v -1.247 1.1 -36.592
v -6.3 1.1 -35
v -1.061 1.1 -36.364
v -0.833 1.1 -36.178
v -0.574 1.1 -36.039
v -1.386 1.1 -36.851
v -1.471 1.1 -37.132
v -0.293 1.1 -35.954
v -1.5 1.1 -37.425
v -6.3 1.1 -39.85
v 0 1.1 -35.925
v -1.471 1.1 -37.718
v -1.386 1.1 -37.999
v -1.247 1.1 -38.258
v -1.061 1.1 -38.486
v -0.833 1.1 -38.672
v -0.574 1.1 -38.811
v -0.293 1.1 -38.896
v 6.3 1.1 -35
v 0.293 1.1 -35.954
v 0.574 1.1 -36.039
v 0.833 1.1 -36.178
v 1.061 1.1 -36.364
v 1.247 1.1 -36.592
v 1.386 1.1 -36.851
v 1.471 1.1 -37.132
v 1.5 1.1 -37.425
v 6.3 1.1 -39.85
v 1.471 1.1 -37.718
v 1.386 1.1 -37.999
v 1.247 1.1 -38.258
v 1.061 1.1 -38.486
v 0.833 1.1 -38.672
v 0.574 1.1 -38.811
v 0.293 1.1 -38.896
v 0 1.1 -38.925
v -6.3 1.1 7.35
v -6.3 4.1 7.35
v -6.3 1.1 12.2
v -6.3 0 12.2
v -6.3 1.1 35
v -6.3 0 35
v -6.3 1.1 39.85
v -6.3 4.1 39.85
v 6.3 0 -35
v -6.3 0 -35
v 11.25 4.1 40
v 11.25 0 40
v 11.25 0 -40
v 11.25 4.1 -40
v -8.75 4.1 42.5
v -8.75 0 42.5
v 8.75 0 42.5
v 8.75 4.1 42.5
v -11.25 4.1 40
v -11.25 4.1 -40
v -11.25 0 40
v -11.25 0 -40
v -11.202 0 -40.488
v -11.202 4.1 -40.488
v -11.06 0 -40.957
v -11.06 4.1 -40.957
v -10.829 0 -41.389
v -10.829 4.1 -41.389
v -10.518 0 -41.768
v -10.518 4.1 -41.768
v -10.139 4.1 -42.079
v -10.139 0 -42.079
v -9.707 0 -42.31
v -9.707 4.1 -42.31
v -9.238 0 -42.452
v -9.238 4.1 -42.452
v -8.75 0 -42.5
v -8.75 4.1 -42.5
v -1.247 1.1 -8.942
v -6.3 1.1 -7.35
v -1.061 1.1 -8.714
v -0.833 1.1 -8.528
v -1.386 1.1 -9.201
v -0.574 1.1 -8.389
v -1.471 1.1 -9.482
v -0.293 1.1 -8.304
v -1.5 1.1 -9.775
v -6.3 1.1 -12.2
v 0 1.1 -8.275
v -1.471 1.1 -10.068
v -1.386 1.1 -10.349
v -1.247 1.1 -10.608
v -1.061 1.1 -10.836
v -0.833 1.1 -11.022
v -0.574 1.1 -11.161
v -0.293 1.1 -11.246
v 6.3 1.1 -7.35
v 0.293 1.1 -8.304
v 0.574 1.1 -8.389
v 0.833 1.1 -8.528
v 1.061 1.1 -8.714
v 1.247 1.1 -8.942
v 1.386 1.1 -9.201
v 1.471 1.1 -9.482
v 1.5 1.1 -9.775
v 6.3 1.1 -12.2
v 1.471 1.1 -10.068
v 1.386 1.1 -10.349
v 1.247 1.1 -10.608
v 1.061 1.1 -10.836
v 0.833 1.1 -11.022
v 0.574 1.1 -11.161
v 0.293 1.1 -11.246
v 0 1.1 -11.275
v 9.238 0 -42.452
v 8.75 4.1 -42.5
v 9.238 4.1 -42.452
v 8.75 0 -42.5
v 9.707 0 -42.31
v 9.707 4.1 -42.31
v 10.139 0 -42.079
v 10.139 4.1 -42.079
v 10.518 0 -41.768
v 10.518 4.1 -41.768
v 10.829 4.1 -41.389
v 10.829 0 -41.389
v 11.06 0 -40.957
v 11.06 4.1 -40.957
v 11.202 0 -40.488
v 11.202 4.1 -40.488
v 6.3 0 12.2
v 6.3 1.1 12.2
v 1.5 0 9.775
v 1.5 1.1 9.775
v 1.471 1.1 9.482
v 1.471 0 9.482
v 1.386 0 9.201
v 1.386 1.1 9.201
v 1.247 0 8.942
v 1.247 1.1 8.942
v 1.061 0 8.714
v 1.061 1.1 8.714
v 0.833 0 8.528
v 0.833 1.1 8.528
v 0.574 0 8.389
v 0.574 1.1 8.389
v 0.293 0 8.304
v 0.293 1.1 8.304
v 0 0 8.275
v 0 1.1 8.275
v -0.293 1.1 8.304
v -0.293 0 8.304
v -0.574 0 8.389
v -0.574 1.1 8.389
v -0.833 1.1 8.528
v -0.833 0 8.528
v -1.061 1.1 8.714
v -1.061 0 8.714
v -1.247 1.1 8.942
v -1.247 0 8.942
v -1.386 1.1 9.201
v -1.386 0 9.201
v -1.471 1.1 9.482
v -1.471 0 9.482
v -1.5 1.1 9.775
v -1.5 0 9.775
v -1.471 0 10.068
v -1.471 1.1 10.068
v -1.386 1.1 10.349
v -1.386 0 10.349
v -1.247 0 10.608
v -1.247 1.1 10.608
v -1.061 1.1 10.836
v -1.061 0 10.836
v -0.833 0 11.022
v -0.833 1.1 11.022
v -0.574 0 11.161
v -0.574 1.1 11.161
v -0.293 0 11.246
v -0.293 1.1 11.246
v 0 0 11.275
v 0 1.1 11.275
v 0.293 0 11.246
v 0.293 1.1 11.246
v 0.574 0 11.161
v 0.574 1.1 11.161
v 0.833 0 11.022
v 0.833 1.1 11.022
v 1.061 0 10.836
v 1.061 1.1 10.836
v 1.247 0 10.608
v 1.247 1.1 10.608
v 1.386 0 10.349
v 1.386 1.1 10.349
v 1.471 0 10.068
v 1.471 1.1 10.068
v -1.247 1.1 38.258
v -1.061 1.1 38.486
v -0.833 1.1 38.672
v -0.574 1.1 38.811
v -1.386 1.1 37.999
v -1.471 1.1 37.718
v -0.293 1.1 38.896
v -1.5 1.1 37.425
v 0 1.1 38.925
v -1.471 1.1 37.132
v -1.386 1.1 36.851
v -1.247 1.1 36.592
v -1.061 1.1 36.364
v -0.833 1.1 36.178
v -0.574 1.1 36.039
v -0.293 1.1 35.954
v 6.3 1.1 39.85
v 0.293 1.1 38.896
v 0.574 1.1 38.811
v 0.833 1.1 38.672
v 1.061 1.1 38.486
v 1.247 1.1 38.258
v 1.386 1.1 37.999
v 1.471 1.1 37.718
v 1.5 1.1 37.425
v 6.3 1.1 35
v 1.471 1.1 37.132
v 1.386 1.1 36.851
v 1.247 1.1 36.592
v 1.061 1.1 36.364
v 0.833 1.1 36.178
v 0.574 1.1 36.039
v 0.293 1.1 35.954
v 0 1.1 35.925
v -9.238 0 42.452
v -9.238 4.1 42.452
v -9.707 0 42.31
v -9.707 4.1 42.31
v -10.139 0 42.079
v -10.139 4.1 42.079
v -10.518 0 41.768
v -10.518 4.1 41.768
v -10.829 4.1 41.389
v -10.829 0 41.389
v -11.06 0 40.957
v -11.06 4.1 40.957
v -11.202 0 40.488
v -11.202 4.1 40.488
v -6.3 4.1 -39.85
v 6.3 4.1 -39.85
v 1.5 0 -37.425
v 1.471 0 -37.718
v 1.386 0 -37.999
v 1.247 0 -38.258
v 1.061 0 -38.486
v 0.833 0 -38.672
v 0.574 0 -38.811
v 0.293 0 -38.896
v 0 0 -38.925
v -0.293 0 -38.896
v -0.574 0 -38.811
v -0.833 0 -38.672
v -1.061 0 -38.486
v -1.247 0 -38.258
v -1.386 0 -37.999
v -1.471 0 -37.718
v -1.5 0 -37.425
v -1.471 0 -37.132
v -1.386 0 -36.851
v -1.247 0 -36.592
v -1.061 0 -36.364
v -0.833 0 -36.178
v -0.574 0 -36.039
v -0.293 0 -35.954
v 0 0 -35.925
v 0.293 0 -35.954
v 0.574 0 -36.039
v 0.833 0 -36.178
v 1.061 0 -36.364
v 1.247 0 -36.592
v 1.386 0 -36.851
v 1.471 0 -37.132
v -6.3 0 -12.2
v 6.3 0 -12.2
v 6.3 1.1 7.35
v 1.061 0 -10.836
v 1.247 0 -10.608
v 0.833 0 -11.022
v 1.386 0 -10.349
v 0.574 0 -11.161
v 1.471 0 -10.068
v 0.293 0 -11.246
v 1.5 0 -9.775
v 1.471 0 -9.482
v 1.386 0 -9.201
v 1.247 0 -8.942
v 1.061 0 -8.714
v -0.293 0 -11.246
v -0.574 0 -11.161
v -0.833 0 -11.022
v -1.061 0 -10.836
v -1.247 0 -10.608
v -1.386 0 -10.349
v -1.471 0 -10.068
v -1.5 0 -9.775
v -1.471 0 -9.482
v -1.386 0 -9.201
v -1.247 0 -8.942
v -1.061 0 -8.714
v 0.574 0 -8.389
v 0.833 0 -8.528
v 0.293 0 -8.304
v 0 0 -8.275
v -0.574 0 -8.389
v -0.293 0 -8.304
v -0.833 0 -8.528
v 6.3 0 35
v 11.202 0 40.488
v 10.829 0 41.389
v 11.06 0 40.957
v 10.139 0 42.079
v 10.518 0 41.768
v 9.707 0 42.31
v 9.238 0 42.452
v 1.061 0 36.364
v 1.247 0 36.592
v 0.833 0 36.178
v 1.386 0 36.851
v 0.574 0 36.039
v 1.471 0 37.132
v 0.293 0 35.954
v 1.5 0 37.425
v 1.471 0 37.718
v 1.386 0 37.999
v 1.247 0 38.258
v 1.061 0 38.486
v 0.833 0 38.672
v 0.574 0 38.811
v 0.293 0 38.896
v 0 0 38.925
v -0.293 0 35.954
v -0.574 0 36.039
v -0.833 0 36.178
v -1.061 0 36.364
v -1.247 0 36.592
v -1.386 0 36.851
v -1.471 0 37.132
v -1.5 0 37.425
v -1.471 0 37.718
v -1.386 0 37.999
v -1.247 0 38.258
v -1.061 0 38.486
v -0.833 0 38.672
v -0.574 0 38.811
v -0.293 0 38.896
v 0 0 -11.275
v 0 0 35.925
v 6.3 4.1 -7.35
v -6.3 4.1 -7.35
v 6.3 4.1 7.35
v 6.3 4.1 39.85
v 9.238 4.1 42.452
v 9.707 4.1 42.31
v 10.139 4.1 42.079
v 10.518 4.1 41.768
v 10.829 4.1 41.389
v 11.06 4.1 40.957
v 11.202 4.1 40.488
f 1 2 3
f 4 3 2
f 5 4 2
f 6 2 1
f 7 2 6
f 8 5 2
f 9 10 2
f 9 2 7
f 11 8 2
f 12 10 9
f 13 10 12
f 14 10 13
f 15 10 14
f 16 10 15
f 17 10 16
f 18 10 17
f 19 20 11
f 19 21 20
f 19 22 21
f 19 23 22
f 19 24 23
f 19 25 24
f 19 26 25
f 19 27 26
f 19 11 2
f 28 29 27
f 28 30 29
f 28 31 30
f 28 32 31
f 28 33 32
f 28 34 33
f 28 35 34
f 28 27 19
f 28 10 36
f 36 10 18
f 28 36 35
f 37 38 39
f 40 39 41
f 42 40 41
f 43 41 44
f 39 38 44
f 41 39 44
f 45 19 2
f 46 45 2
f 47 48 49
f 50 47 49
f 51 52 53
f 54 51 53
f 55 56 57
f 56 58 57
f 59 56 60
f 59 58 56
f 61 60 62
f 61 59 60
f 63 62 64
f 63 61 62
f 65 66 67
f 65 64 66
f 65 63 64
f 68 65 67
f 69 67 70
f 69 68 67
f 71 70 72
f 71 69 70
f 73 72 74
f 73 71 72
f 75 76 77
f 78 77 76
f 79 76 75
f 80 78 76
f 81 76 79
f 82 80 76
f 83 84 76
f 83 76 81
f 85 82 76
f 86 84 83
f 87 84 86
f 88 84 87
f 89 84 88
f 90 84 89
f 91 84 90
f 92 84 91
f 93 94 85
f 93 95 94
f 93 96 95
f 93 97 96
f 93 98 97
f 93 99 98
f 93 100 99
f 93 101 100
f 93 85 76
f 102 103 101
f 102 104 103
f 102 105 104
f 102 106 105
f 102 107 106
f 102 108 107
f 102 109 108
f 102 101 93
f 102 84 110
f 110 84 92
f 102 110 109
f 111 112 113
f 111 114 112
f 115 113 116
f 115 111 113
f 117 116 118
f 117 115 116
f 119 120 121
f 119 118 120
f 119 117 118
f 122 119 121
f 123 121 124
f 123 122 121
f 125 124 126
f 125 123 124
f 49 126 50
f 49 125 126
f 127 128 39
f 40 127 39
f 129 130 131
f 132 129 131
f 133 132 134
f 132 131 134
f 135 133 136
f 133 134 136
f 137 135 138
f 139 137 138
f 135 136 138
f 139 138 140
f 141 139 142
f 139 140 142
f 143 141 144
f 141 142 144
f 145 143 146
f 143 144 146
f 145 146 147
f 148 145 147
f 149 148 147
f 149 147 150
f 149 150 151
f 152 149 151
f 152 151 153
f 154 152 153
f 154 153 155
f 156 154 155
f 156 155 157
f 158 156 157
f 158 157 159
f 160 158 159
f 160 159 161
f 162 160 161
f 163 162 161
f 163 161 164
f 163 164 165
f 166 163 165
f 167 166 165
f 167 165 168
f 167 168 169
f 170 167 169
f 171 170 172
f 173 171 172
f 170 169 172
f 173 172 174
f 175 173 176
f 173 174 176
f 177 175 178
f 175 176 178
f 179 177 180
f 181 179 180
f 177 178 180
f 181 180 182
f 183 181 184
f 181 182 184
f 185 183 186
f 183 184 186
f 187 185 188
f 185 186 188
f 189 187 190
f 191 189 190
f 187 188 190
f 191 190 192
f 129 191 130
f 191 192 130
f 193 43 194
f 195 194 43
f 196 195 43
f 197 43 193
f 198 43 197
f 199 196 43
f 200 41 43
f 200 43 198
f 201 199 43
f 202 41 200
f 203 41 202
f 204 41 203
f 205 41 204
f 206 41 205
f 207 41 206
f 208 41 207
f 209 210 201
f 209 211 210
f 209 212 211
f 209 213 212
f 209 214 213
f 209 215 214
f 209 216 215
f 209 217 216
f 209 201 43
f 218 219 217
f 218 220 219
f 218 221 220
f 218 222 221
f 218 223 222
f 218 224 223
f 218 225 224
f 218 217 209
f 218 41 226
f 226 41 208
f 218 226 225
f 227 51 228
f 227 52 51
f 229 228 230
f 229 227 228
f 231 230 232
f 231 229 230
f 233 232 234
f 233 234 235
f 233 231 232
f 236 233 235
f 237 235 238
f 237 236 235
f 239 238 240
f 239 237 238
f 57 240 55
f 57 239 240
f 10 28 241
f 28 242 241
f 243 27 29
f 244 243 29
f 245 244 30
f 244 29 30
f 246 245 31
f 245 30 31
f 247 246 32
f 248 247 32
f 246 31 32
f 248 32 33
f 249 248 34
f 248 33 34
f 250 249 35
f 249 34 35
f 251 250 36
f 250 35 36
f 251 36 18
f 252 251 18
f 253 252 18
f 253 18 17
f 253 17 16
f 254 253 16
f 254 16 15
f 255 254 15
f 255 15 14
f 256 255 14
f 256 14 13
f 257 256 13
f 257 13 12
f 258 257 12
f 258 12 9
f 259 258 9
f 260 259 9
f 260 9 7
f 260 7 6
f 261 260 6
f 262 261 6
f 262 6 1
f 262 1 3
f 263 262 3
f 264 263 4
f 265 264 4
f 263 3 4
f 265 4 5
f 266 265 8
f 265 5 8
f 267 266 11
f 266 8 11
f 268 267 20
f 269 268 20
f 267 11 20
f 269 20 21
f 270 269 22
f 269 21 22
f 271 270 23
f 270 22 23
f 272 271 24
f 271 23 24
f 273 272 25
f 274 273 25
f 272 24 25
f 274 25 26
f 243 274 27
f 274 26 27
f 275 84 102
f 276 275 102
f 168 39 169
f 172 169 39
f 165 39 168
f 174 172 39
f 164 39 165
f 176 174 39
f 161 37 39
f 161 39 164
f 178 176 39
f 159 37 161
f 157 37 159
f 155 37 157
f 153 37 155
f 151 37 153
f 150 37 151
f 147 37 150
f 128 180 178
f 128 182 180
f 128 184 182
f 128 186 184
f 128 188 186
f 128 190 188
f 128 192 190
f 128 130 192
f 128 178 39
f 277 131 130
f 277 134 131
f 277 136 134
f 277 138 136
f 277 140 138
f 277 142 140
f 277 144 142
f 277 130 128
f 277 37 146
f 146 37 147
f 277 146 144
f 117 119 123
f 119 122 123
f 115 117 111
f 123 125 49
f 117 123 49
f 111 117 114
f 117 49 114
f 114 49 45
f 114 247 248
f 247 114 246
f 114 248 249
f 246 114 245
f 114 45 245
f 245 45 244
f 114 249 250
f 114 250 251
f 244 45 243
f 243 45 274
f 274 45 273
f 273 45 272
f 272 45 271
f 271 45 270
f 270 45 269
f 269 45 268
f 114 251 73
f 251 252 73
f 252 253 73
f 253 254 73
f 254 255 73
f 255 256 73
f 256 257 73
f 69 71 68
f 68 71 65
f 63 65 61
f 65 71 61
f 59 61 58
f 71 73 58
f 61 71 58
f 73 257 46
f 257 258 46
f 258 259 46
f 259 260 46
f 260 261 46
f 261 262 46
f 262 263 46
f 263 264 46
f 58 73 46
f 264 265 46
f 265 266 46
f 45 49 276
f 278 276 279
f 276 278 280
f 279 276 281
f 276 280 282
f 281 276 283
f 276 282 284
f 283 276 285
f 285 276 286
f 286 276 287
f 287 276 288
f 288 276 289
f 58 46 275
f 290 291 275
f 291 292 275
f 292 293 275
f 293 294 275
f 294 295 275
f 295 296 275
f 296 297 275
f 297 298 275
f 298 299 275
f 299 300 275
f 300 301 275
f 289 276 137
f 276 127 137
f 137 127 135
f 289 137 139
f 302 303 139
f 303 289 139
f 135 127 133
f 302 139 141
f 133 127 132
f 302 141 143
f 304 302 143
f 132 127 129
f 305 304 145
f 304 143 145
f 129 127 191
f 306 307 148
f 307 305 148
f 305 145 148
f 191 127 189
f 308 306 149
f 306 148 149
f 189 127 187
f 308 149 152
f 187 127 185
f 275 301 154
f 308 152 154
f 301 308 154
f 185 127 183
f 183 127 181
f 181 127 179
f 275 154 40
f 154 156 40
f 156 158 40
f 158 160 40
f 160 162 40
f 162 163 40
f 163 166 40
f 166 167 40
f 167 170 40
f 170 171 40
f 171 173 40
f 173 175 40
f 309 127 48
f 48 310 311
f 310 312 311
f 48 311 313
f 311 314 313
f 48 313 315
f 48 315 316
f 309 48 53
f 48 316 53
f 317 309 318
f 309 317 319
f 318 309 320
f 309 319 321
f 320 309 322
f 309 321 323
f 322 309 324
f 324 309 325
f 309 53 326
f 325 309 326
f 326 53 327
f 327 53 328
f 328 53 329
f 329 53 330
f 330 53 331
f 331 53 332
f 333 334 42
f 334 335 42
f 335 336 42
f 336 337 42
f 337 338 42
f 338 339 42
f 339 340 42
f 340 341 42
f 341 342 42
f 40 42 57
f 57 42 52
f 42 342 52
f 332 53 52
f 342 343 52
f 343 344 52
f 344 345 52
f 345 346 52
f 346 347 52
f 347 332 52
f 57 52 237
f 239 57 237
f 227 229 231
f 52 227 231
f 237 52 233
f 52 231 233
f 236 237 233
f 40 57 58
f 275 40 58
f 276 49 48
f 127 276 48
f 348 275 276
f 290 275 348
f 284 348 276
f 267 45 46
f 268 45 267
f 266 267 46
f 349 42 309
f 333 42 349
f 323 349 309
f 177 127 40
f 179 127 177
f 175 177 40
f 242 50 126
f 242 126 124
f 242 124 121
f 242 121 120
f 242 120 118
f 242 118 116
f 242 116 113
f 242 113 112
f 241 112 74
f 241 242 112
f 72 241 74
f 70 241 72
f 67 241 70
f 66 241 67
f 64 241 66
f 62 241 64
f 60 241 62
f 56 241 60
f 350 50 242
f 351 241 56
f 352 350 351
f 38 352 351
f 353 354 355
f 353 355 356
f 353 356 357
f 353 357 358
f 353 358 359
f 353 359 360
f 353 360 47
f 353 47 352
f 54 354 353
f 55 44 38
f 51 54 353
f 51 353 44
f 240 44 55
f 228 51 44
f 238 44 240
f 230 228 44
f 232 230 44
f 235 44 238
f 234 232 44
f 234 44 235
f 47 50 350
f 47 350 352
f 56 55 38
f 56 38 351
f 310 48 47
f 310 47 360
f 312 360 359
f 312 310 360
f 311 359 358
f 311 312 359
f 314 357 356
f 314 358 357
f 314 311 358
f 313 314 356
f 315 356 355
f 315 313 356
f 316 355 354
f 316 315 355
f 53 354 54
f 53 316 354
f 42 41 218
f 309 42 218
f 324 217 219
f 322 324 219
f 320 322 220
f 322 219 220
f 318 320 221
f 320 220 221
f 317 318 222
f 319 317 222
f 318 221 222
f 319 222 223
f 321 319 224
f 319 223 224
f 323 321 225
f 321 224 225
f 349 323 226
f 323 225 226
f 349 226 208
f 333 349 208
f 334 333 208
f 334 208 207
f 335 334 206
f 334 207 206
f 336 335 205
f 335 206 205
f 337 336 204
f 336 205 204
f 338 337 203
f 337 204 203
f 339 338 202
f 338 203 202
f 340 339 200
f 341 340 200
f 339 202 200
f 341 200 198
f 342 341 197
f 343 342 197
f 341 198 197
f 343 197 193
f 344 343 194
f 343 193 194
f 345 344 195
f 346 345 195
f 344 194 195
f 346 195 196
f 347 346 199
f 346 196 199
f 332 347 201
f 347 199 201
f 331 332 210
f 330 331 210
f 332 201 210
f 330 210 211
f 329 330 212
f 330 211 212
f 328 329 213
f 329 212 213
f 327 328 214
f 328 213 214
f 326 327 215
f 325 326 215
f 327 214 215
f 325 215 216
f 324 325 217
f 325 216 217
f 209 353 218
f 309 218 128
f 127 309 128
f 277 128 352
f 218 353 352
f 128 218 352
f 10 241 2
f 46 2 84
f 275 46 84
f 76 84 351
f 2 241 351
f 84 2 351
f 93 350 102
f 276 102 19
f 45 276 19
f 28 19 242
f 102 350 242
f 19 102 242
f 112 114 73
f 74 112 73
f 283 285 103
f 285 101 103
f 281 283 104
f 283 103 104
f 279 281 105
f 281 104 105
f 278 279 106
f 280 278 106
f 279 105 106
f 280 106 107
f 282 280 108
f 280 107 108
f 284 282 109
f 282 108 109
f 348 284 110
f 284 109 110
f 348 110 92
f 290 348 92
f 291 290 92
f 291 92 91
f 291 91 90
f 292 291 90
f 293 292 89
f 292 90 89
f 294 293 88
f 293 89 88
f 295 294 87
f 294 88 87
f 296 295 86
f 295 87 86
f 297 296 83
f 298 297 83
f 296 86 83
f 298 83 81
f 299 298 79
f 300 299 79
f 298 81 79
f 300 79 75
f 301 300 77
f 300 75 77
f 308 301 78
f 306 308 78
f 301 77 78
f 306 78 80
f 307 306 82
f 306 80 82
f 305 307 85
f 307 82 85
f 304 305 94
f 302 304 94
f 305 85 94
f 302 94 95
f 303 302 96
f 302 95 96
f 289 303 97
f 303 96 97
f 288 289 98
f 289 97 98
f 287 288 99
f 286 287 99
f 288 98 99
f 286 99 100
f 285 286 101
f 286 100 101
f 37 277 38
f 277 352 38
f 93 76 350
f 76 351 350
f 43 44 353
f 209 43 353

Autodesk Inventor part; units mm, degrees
ref_plane "YZ Plane" through (0, 0, 0) normal (1, 0, 0) x (0, 1, 0)
ref_plane "XZ Plane" through (0, 0, 0) normal (0, 1, 0) x (-1, 0, 0)
ref_plane "XY Plane" through (0, 0, 0) normal (0, 0, 1) x (1, 0, 0)
sketch "Szkic1" plane through (0, 0, 0) normal (0, 1, 0) x (-1, 0, 0)
  line L0 (8.75, 42.5) -> (-8.75, 42.5)
  line L1 (-11.25, 40) -> (-11.25, -40)
  line L2 (-8.75, -42.5) -> (8.75, -42.5)
  line L3 (11.25, -40) -> (11.25, 40)
  line L4 (-11.25, 42.5) -> (11.25, -42.5)
  line L5 (-11.25, -42.5) -> (11.25, 42.5)
  arc A0 (11.25, 40) -> (8.75, 42.5) centre (8.75, 40) ccw
  arc A1 (-8.75, 42.5) -> (-11.25, 40) centre (-8.75, 40) ccw
  arc A2 (-11.25, -40) -> (-8.75, -42.5) centre (-8.75, -40) ccw
  arc A3 (8.75, -42.5) -> (11.25, -40) centre (8.75, -40) ccw
  point P0 (0, 0)
  point P1 (0, 0)
  dimension "d0" = 22.5
  dimension "d1" = 85
  dimension "d2" = 2.5
extrude "Wyciągnięcie proste1" add sketch "Szkic1" along normal blind 4.1
sketch "Szkic2" plane through (0, 4.1, 0) normal (0, 1, 0) x (1, 0, 0)
  line L0 (-6.3, -35) -> (6.3, -35)
  line L1 (6.3, -35) -> (6.3, -12.2)
  line L2 (6.3, -12.2) -> (-6.3, -12.2)
  line L3 (-6.3, -12.2) -> (-6.3, -35)
  line L4 (-8.75, -42.5) -> (8.75, -42.5) projected
  line L5 (11.25, -40) -> (11.25, 40) projected
  line L6 (-6.3, 12.2) -> (6.3, 12.2)
  line L7 (6.3, 12.2) -> (6.3, 35)
  line L8 (6.3, 35) -> (-6.3, 35)
  line L9 (-6.3, 35) -> (-6.3, 12.2)
  line L10 (-15.75, 0) -> (15.75, 0) projected
  point P0 (0, 0)
  point P1 (0, -35)
  dimension "d5" = 12.6
  dimension "d6" = 22.8
  dimension "d7" = 7.5
  dimension "d8" = 11.25
extrude "Wyciągnięcie proste2" cut sketch "Szkic2" against normal blind 4.1
sketch "Szkic4" plane through (0, 4.1, 0) normal (0, 1, 0) x (1, 0, 0)
  line L0 (-6.3, -39.85) -> (6.3, -39.85)
  line L1 (6.3, -39.85) -> (6.3, -7.35)
  line L2 (6.3, -7.35) -> (-6.3, -7.35)
  line L3 (-6.3, -7.35) -> (-6.3, -39.85)
  line L4 (6.3, -35) -> (-6.3, -35) projected
  line L5 (-6.3, -12.2) -> (6.3, -12.2) projected
  line L6 (-6.3, 7.35) -> (6.3, 7.35)
  line L7 (6.3, 7.35) -> (6.3, 39.85)
  line L8 (6.3, 39.85) -> (-6.3, 39.85)
  line L9 (-6.3, 39.85) -> (-6.3, 7.35)
  line L10 (6.3, 12.2) -> (-6.3, 12.2) projected
  line L11 (-6.3, 35) -> (6.3, 35) projected
  point P0 (0, 0)
  dimension "d11" = 4.85
  dimension "d12" = 4.85
  dimension "d13" = 4.85
  dimension "d14" = 4.85
extrude "Wyciągnięcie proste3" cut sketch "Szkic4" against normal blind 3 contours L3 L4 L1 L0 | L3 L2 L1 L5 | L9 L10 L7 L6 | L9 L8 L7 L11
sketch "Szkic5" plane through (0, 1.1, 0) normal (0, 1, 0) x (1, 0, 0)
  circle A0 centre (0, -37.425) radius 1.5
  circle A1 centre (0, -9.775) radius 1.5
  circle A2 centre (0, 9.775) radius 1.5
  circle A3 centre (0, 37.425) radius 1.5
  line L0 (-6.3, -35) -> (6.3, -35) projected
  line L1 (6.3, -12.2) -> (-6.3, -12.2) projected
  line L2 (-6.3, 12.2) -> (6.3, 12.2) projected
  line L3 (6.3, 35) -> (-6.3, 35) projected
  point P0 (0, 0)
  point P1 (0, -35)
  point P2 (0, -12.2)
  point P3 (0, 12.2)
  point P4 (0, 35)
  dimension "d17" = 3
  dimension "d18" = 3
  dimension "d19" = 3
  dimension "d20" = 3
  dimension "d21" = 2.425
  dimension "d22" = 2.425
  dimension "d23" = 2.425
  dimension "d24" = 2.425
extrude "Wyciągnięcie proste4" cut sketch "Szkic5" against normal blind 3
properties part number "arm_medium_part"
